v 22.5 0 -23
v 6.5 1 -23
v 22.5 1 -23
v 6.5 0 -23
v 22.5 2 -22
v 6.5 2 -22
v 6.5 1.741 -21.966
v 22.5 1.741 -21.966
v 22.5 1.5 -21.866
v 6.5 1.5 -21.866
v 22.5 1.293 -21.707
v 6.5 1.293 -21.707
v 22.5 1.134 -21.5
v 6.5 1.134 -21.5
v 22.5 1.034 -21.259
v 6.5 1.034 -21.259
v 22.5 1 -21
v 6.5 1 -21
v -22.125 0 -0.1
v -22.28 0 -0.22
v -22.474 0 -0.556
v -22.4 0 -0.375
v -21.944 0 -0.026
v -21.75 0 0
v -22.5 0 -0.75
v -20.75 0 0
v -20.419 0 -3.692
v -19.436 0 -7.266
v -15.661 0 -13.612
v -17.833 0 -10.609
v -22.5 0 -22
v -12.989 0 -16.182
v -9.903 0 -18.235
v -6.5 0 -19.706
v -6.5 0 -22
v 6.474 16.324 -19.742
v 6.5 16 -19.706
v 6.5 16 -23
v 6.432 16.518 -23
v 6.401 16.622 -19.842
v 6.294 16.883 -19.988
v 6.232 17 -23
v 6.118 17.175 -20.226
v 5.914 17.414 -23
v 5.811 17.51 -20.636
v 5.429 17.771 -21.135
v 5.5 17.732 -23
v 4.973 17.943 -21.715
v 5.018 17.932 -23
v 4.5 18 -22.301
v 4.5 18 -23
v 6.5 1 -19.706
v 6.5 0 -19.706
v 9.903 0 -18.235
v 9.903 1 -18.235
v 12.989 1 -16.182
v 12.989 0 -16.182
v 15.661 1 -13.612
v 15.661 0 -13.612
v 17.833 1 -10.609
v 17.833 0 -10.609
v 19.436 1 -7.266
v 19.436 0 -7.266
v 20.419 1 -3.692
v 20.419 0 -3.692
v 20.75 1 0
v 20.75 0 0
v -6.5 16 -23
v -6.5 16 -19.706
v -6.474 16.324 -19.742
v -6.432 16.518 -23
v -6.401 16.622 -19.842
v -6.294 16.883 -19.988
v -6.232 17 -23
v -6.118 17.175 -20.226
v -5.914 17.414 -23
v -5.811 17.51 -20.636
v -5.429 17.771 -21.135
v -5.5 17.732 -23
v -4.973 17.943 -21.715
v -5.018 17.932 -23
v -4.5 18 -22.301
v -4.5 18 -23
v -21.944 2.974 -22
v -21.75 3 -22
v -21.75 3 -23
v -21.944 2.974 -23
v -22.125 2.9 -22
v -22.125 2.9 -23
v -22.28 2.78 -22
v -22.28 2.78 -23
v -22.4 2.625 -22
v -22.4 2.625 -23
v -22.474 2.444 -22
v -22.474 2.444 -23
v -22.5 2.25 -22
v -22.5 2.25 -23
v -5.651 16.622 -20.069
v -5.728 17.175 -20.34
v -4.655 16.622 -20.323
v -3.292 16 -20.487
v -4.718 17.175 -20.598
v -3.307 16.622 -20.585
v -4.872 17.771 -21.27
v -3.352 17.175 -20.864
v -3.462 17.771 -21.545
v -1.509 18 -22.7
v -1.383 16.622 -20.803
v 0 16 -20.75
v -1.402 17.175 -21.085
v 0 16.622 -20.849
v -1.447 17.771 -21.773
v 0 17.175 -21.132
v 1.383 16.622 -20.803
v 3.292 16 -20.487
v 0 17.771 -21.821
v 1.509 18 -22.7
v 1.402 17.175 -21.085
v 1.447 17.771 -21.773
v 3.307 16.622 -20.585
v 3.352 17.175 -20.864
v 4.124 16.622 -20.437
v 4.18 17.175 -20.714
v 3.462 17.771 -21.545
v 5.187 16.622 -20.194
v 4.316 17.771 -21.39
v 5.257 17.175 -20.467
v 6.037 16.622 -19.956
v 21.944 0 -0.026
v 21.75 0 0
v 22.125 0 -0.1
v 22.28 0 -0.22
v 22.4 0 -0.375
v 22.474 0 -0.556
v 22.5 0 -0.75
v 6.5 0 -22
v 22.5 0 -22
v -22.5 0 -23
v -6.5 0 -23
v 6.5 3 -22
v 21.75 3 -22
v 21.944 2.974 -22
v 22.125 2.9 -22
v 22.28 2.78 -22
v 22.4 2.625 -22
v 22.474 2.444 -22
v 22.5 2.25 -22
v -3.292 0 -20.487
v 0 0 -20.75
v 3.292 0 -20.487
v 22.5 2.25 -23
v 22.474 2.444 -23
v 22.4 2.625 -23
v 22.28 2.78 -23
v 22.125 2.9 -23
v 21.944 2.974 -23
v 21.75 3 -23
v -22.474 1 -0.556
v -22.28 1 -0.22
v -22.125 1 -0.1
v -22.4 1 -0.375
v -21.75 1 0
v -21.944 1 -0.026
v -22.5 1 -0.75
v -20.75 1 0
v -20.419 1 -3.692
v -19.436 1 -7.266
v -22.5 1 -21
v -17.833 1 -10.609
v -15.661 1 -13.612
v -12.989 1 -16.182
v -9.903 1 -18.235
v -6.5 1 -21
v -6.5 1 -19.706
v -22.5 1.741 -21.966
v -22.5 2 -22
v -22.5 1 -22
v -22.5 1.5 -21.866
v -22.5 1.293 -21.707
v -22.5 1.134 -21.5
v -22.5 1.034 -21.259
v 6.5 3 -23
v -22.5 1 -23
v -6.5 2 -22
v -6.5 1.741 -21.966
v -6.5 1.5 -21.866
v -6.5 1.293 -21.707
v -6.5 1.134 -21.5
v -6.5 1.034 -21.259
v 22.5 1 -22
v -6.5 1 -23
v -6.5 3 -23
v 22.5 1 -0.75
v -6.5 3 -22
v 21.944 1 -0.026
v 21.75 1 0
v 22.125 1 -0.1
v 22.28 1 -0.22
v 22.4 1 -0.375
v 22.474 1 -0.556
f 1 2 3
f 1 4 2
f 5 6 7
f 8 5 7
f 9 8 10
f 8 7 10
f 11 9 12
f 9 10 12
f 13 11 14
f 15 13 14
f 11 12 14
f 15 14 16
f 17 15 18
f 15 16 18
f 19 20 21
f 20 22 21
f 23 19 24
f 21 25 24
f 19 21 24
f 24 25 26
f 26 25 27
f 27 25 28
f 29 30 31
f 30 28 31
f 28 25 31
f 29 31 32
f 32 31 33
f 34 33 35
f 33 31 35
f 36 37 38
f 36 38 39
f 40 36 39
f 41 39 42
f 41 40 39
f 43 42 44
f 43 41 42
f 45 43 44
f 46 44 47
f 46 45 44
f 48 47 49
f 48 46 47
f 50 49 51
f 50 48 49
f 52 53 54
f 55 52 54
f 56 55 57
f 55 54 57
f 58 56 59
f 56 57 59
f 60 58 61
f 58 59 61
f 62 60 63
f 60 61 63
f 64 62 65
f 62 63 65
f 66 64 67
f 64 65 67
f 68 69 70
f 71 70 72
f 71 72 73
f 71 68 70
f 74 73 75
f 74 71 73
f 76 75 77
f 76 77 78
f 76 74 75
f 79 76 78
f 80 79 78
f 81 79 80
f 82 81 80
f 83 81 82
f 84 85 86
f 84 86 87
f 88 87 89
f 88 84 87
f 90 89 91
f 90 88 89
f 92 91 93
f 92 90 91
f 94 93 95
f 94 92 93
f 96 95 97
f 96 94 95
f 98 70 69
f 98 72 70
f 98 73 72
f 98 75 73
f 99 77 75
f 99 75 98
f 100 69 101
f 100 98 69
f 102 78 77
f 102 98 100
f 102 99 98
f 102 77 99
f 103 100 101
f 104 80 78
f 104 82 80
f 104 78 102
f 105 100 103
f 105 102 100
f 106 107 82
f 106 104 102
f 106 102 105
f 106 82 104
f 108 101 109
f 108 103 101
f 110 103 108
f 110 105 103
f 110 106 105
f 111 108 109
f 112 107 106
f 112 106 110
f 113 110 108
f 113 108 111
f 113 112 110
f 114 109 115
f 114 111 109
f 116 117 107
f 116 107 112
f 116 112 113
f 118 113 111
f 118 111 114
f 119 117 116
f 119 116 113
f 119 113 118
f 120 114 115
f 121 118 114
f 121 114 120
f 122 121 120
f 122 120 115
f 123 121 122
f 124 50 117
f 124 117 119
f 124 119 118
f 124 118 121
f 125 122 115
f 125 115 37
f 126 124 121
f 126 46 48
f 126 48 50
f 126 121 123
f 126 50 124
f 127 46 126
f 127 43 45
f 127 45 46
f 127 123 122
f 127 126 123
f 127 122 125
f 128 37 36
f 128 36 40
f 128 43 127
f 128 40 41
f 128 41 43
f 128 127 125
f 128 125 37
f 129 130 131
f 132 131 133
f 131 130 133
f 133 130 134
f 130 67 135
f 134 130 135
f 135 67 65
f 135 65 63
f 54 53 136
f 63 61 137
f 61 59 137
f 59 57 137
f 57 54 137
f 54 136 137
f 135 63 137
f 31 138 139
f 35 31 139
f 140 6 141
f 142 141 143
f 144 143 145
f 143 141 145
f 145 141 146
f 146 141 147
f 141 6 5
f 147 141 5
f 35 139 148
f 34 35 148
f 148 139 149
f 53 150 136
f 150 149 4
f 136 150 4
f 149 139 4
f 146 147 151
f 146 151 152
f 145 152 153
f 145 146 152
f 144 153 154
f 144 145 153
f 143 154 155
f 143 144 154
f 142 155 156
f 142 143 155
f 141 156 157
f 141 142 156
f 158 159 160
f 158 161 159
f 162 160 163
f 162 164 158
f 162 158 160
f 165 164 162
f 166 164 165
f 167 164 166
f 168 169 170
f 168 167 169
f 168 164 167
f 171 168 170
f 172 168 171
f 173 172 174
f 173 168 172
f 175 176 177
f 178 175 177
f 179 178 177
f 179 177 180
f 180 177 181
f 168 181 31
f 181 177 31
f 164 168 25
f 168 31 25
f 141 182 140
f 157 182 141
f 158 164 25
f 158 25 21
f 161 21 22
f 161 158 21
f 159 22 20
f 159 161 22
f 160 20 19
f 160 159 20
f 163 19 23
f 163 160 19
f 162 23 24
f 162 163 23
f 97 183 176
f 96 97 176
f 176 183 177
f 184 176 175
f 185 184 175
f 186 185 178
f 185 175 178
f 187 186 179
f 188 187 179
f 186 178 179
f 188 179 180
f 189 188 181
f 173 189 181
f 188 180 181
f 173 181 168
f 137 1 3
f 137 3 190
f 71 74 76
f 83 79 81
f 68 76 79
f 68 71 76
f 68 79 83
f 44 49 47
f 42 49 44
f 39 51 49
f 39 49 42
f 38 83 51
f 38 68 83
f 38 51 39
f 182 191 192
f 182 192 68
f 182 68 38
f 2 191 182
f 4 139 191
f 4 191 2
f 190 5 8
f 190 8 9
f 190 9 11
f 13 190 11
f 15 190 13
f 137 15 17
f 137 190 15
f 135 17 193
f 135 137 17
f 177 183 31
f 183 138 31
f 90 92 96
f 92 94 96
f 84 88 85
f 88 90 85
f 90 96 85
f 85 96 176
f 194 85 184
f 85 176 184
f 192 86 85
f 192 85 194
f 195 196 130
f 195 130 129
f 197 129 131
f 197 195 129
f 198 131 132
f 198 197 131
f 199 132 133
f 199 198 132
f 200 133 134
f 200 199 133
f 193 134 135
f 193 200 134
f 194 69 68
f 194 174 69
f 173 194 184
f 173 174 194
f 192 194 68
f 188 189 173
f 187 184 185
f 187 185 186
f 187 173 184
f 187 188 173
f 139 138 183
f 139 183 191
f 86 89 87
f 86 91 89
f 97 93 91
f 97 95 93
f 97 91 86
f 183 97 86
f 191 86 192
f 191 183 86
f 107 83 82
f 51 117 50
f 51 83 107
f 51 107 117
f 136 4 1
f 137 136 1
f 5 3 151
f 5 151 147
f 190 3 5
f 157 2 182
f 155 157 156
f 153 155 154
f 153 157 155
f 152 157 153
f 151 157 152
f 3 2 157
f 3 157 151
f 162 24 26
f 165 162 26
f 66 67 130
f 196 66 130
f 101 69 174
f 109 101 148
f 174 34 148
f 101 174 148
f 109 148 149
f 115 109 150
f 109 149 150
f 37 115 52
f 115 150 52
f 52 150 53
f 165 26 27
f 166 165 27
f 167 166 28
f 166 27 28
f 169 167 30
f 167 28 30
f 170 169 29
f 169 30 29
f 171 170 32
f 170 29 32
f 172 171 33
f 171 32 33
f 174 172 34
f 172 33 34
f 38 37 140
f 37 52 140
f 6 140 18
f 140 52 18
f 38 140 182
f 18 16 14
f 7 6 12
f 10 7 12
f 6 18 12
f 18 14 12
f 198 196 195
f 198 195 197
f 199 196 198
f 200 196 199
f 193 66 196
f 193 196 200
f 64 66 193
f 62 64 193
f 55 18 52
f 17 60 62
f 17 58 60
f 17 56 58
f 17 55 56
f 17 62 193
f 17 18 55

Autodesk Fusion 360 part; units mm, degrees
sketch "Sketch1" plane through (0, 0, 0) normal (0, 1, 0) x (1, 0, 0) in component "Component"
  circle A0 centre (0, 0) radius 20.75
  line L0 (-22.5, 23) -> (22.5, 23)
  line L1 (0, 0) -> (0, 23) construction
  line L2 (-22.5, 23) -> (-22.5, 0)
  line L3 (22.5, 23) -> (22.5, 0)
  line L4 (-22.5, 0) -> (22.5, 0)
  line L5 (6.5, 19.7056) -> (6.5, 23)
  line L6 (-6.5, 19.7056) -> (-6.5, 23)
  line L7 (-22.5, 22) -> (22.5, 22)
  dimension "d1" = 41.5
  dimension "d2" = 45
  dimension "d3" = 23
  dimension "d4" = 13
  dimension "d9" = 1
extrude "Extrude1" add sketch "Sketch1" along normal blind 1 contours A0 L3 L4 L5 L7 | A0 L2 L4 L6 L7 | L0 L3 L5 L7 | L0 L2 L6 L7 makes body 1 at (13.5543, 0, -21.0541) makes body 2 at (-13.5543, 0, -21.0541) in component "Component"
extrude "Extrude2" add sketch "Sketch1" along normal blind 18 contours A0 L5 L6 L7 | L0 L5 L6 L7 bodies 1 2 in component "Component"
extrude "Extrude3" add sketch "Sketch1" along normal blind 3 contours L0 L3 L5 L7 | L0 L2 L6 L7 bodies 1 in component "Component"
fillet "Fillet1" radius 2 3 edges at (0, 18, -20.75) (6.5, 18, -21.3528) (-6.5, 18, -21.3528) on bodies 1 in component "Component"
fillet "Fillet2" radius 0.75 4 edges at (22.5, 0.5, 0) (-22.5, 0.5, 0) (22.5, 3, -22.5) (-22.5, 3, -22.5) on bodies 1 in component "Component"
fillet "Fillet3" radius 1 2 edges at (14.5, 1, -22) (-14.5, 1, -22) on bodies 1 in component "Component"
component "Component" placed x (1, 0, 0) y (0, 1, 0) z (0, 0, 1) at (0, 0, 0)
